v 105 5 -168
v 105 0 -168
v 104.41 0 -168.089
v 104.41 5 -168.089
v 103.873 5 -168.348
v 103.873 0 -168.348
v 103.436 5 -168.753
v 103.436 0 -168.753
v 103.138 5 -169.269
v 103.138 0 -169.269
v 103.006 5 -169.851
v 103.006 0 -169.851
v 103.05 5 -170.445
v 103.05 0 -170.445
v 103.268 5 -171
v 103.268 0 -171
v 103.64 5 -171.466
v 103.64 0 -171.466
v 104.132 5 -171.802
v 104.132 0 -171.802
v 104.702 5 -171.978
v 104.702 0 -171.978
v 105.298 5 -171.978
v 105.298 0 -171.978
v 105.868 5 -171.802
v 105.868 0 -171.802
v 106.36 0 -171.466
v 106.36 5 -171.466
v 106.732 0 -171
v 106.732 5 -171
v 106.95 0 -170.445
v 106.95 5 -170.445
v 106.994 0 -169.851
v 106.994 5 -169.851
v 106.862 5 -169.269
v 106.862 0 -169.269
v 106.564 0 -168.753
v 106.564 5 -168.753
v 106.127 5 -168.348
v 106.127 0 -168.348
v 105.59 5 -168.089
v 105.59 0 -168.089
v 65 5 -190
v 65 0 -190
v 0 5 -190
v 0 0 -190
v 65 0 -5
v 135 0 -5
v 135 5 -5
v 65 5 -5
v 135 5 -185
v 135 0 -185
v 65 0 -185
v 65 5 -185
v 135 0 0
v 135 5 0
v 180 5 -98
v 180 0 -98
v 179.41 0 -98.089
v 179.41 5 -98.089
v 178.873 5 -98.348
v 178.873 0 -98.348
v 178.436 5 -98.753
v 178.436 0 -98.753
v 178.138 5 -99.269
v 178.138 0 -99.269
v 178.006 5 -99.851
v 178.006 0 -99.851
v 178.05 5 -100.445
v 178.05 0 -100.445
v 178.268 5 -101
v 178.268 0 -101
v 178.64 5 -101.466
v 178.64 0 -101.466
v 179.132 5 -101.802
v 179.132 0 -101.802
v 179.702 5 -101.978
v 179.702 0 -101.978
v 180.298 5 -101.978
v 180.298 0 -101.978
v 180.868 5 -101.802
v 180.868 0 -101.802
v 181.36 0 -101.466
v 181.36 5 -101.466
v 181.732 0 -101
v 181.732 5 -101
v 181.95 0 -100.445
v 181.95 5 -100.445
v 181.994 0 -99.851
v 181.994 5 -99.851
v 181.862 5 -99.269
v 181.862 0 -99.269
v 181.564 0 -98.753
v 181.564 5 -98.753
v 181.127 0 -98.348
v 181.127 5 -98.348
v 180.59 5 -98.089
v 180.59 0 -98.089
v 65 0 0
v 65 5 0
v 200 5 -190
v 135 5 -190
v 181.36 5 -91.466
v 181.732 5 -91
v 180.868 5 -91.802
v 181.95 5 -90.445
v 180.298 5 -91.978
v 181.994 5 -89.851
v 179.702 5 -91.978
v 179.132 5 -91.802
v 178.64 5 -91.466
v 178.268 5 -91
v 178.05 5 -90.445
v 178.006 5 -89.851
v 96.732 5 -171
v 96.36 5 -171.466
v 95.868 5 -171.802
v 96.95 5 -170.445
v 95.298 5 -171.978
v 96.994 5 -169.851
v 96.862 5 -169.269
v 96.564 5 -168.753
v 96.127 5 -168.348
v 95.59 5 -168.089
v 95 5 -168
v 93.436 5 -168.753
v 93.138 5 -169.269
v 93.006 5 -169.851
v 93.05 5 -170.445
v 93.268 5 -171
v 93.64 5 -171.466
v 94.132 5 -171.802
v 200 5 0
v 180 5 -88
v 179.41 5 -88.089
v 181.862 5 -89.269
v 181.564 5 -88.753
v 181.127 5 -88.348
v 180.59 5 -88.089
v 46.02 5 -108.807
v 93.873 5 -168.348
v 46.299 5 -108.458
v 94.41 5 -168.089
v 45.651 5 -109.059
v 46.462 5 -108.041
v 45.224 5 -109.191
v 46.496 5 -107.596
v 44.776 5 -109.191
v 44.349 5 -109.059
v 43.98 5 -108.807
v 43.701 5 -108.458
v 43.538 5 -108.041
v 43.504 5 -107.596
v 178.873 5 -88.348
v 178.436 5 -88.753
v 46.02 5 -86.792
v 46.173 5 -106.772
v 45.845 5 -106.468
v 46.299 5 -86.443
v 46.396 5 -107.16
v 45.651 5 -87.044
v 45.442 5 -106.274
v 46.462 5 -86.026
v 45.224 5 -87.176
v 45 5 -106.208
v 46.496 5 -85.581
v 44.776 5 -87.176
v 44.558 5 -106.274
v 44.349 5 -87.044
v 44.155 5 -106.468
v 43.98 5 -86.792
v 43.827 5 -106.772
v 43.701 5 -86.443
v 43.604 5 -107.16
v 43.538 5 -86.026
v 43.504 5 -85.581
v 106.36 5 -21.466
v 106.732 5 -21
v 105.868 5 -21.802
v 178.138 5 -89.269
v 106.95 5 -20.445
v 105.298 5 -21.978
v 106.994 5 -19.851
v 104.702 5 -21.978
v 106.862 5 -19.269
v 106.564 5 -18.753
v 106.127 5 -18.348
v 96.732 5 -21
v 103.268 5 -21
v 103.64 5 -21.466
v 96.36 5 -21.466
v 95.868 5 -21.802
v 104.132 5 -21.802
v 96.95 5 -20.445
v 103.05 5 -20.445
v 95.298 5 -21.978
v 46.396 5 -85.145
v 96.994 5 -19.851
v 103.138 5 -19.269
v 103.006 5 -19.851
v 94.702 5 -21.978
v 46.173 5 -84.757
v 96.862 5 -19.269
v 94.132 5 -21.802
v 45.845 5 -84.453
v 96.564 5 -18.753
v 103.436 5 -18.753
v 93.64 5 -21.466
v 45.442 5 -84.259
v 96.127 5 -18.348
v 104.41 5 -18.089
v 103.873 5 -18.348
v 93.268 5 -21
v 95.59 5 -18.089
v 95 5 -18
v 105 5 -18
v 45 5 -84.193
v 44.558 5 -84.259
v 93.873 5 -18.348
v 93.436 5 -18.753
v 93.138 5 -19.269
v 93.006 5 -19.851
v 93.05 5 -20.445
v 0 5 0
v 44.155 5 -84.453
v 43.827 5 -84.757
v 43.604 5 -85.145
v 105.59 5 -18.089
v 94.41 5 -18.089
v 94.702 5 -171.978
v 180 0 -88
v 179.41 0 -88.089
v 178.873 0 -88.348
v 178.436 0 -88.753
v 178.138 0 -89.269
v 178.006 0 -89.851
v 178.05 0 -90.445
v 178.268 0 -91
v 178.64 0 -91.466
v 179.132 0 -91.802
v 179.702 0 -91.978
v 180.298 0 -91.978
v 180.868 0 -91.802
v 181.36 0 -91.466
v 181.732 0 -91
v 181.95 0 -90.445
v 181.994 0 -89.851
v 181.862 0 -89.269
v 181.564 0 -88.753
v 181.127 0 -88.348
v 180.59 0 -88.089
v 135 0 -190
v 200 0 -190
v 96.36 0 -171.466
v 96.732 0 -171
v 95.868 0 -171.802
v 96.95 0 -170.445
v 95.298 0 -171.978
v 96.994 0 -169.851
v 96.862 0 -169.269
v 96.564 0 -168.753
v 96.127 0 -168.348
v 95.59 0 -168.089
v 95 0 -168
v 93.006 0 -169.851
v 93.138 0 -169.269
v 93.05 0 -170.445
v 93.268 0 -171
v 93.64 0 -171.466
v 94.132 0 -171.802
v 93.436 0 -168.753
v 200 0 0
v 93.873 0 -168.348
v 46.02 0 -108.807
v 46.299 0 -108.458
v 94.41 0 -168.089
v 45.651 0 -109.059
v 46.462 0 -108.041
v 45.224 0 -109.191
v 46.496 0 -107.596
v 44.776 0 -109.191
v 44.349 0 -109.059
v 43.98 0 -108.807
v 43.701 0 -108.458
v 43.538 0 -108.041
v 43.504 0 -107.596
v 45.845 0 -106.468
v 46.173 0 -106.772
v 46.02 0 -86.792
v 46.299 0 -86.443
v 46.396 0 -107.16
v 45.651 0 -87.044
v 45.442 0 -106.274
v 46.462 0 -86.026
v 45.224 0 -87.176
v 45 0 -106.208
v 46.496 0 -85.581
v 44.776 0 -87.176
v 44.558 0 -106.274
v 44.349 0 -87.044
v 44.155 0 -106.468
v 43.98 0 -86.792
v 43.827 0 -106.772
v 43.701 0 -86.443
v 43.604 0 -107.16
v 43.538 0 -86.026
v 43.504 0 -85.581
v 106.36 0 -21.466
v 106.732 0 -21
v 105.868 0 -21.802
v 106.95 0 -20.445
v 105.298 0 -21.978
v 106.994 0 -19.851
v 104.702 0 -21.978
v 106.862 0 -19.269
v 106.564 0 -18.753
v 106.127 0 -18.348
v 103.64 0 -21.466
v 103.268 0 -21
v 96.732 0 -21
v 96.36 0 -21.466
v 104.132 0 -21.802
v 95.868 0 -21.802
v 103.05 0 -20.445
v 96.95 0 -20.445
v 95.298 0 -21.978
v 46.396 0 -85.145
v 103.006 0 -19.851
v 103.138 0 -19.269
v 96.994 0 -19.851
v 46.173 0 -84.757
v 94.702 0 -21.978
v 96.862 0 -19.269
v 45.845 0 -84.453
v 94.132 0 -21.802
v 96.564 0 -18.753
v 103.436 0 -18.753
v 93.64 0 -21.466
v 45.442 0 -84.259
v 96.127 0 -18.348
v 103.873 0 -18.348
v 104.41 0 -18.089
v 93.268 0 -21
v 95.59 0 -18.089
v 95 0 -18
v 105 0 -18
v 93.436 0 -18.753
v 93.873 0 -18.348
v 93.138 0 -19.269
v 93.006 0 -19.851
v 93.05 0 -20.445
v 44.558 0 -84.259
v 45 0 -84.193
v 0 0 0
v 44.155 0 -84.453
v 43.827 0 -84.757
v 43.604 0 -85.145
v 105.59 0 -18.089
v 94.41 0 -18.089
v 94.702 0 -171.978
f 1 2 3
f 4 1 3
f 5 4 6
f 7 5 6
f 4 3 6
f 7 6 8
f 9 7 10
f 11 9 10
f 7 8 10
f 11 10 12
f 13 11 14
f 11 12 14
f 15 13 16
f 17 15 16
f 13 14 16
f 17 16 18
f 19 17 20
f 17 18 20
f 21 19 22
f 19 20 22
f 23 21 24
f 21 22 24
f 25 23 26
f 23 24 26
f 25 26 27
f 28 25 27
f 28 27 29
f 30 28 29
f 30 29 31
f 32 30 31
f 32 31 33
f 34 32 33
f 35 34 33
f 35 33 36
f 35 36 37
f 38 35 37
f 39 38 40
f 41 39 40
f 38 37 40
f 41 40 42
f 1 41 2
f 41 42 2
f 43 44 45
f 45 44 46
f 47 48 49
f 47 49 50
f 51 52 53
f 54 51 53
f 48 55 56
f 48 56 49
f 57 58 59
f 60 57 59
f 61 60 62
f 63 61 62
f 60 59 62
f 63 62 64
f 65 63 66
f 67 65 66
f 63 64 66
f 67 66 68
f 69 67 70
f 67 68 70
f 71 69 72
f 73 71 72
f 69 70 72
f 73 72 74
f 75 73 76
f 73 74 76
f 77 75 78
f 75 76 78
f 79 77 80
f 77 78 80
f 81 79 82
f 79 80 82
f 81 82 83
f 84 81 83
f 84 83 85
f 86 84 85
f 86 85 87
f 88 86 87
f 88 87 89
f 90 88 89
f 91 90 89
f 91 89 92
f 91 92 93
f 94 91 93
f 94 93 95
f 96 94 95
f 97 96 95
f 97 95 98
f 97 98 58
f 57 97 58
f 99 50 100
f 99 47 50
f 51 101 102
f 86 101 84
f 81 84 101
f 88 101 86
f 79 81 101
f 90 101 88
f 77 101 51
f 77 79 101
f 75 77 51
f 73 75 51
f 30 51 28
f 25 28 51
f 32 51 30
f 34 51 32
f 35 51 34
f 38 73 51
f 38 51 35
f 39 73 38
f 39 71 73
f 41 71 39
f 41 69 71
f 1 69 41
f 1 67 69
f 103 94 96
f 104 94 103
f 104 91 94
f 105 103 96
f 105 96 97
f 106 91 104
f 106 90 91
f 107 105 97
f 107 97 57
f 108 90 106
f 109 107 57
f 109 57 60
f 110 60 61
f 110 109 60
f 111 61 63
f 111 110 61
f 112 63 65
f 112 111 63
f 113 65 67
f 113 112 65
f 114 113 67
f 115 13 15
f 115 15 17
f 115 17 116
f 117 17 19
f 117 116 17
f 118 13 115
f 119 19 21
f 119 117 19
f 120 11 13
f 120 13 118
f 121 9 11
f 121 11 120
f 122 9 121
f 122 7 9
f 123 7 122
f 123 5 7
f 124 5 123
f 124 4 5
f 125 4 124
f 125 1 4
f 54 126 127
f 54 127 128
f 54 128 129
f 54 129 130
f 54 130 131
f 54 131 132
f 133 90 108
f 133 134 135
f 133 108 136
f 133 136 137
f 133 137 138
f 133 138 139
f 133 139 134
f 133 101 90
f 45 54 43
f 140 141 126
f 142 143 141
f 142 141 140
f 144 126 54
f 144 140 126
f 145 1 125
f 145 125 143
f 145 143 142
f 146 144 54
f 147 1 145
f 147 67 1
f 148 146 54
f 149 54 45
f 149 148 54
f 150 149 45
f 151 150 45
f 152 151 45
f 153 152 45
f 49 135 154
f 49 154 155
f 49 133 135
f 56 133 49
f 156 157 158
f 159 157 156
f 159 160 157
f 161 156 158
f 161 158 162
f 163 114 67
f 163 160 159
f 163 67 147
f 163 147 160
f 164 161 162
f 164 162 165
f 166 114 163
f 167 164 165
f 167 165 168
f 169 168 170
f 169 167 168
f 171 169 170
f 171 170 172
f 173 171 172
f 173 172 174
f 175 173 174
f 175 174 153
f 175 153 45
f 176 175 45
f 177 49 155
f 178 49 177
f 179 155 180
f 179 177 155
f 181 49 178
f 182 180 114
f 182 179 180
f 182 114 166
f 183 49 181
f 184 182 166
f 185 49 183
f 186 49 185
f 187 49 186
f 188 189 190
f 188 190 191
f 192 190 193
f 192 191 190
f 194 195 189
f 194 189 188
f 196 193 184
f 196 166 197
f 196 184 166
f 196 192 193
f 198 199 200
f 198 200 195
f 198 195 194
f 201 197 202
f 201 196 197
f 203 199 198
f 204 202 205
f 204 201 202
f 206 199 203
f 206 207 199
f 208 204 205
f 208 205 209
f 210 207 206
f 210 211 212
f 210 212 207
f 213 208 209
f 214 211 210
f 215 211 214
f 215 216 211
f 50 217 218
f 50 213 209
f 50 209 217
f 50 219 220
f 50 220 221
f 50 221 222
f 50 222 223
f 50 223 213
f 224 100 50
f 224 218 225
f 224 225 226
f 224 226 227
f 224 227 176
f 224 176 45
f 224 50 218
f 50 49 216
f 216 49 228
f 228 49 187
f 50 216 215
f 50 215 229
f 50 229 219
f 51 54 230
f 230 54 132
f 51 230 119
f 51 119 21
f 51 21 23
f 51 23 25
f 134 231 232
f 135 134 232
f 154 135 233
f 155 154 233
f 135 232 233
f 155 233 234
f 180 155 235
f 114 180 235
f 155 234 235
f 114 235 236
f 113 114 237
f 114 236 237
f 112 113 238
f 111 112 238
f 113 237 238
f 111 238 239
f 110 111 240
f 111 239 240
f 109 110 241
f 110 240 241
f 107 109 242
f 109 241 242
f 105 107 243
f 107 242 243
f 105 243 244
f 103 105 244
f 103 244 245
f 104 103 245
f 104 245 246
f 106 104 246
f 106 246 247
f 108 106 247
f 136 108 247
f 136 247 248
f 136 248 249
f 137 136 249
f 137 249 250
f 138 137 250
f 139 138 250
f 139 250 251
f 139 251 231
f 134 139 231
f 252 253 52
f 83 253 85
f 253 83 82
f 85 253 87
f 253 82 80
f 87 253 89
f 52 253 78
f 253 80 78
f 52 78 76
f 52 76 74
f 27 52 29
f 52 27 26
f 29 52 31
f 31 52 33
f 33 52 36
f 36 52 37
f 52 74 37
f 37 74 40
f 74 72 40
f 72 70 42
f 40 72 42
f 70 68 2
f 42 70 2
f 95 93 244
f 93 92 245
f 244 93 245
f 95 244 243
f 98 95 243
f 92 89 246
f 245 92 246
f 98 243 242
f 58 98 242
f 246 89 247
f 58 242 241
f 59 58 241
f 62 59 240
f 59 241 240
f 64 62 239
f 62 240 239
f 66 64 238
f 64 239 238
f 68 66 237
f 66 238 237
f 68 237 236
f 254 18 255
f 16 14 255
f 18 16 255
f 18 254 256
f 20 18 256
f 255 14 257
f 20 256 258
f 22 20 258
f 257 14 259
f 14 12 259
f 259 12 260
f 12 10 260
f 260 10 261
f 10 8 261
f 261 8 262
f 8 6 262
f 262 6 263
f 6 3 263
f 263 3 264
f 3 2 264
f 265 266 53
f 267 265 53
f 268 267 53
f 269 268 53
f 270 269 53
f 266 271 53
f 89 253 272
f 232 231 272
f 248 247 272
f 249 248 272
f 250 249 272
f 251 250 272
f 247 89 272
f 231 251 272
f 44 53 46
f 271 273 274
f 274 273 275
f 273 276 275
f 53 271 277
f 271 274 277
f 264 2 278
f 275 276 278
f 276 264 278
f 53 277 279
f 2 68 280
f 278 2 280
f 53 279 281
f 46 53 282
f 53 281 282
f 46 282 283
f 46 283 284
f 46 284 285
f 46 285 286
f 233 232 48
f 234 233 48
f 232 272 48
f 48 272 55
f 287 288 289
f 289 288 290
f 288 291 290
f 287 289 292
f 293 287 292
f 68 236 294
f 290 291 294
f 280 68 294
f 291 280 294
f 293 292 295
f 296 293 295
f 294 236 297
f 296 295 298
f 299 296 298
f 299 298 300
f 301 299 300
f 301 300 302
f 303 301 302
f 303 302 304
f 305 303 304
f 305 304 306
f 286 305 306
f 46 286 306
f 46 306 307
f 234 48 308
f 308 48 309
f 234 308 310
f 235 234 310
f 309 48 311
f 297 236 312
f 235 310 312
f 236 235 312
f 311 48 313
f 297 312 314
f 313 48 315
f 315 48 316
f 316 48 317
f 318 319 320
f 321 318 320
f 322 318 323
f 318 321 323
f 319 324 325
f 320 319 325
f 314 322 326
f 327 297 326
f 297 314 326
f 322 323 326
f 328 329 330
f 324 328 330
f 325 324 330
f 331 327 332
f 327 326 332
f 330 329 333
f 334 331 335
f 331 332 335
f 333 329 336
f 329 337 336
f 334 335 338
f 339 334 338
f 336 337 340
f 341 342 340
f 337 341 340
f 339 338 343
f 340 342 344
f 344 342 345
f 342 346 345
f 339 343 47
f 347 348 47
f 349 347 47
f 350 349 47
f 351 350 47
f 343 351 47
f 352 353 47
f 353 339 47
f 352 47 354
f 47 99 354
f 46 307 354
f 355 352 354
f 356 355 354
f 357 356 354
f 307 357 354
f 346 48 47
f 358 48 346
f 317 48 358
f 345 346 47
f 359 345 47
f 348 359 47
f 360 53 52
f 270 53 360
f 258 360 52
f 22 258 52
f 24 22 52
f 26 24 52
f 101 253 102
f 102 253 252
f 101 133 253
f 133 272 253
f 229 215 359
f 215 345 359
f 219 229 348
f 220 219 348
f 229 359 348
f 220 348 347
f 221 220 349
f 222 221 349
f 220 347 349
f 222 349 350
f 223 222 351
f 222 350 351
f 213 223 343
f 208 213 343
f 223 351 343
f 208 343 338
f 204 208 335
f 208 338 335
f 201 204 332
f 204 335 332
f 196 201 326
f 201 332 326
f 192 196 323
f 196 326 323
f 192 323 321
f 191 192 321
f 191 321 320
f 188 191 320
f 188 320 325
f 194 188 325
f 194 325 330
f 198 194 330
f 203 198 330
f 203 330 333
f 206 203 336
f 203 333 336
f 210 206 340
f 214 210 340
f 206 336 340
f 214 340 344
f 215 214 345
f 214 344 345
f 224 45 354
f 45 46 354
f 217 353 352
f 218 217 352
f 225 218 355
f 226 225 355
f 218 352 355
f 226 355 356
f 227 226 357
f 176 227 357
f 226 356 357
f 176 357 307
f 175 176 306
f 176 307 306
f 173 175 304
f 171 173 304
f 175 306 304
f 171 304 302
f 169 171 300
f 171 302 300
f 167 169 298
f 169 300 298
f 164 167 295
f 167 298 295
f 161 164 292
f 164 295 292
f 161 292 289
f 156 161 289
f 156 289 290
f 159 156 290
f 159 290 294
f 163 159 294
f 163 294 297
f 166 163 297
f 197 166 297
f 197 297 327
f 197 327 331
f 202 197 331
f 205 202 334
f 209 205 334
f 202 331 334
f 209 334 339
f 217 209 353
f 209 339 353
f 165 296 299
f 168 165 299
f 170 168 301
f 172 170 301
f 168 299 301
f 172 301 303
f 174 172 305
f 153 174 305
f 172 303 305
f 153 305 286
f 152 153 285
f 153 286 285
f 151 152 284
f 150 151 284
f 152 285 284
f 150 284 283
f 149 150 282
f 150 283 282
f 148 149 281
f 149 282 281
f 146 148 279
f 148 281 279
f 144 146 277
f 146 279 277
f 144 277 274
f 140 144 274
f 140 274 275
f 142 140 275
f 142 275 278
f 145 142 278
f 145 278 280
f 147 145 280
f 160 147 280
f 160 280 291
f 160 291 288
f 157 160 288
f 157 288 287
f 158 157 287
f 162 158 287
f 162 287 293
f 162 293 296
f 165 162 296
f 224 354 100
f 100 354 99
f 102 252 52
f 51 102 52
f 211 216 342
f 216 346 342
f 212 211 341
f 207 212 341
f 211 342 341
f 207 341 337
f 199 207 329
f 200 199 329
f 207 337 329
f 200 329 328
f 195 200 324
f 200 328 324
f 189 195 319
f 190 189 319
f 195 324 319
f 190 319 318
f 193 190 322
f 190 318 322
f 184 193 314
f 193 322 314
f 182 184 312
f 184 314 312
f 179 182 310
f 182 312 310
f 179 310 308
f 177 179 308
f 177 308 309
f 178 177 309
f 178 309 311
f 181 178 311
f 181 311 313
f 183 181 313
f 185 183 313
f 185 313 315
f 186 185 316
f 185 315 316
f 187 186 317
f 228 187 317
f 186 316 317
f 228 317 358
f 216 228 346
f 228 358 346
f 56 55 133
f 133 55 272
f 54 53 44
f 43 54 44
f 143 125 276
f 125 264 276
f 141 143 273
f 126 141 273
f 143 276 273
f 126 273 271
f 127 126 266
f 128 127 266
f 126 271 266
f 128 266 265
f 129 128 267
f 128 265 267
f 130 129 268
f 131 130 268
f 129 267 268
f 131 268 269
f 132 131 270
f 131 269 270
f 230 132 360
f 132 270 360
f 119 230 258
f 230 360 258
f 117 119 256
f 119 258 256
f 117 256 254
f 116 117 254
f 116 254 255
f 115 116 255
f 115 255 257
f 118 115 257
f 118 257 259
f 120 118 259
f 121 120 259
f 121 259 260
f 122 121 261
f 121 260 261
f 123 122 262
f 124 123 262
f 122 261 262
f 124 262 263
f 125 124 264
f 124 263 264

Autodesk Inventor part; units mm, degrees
ref_plane "YZ Plane" through (0, 0, 0) normal (1, 0, 0) x (0, 1, 0)
ref_plane "XZ Plane" through (0, 0, 0) normal (0, 1, 0) x (-1, 0, 0)
ref_plane "XY Plane" through (0, 0, 0) normal (0, 0, 1) x (1, 0, 0)
sketch "Sketch1" plane through (0, 0, 0) normal (0, 1, 0) x (-1, 0, 0)
  line L0 (0, 0) -> (-200, 0)
  line L1 (-200, 0) -> (-200, -190)
  line L2 (-200, -190) -> (0, -190)
  line L3 (0, -190) -> (0, 0)
  line L4 (-65, 0) -> (-135, 0)
  line L5 (-135, 0) -> (-135, -5)
  line L6 (-135, -5) -> (-65, -5)
  line L7 (-65, -5) -> (-65, 0)
  line L8 (-200, -95) -> (0, -95) construction
  line L9 (-65, -190) -> (-135, -190)
  line L10 (-135, -190) -> (-135, -185)
  line L11 (-135, -185) -> (-65, -185)
  line L12 (-65, -185) -> (-65, -190)
  line L13 (-200, -215) -> (-200, -15)
  dimension "d0" = 200
  dimension "d2" = 70
  dimension "d3" = 5
  dimension "d11" = 0
  dimension "d13" = 190
extrude "Extrusion1" add sketch "Sketch1" along normal blind 5 contours L3 L2 L12 L11 L10 L1 L0 L5 L6 L7
sketch "Sketch2" plane through (0, 5, 0) normal (0, 1, 0) x (1, 0, 0)
  line L0 (0, 0) -> (65, 0) projected
  line L1 (135, 0) -> (200, 0) projected
  line L2 (65, 0) -> (65, 5) projected
  line L3 (0, 190) -> (0, 0) projected
  line L4 (0, 95) -> (200, 95)
  point P0 (95, 20)
  point P1 (105, 20)
  point P2 (95, 170)
  point P3 (105, 170)
  dimension "d22" = 20
  dimension "d23" = 10
  dimension "d24" = 20
  dimension "d25" = 30
hole "Hole1" at (95, 5, -20) at (105, 5, -20) at (95, 5, -170) at (105, 5, -170) direction (0, -1, 0) diameter 4 end through all
sketch "Sketch5" plane through (0, 5, 0) normal (0, 1, 0) x (1, 0, 0)
  line L0 (200, 0) -> (200, 190) projected
  line L1 (200, 190) -> (135, 190) projected
  point P0 (0, 0)
  point P1 (180, 90)
  point P2 (180, 100)
  dimension "d51" = 20
  dimension "d52" = 20
  dimension "d53" = 10
  dimension "d54" = 90
hole "Hole4" at (180, 5, -90) at (180, 5, -100) direction (0, -1, 0) diameter 4 end through all
sketch "Sketch6" plane through (0, 5, 0) normal (0, 1, 0) x (1, 0, 0)
  line L0 (0, 190) -> (0, 0) projected
  point P0 (45, 85.6926)
  point P1 (45, 107.7076)
  dimension "d62" = 45
  dimension "d63" = 45
  dimension "d64" = 22.015
hole "Hole5" at (45, 5, -85.6926) at (45, 5, -107.7076) direction (0, -1, 0) diameter 3 end through all
properties part number "top"
